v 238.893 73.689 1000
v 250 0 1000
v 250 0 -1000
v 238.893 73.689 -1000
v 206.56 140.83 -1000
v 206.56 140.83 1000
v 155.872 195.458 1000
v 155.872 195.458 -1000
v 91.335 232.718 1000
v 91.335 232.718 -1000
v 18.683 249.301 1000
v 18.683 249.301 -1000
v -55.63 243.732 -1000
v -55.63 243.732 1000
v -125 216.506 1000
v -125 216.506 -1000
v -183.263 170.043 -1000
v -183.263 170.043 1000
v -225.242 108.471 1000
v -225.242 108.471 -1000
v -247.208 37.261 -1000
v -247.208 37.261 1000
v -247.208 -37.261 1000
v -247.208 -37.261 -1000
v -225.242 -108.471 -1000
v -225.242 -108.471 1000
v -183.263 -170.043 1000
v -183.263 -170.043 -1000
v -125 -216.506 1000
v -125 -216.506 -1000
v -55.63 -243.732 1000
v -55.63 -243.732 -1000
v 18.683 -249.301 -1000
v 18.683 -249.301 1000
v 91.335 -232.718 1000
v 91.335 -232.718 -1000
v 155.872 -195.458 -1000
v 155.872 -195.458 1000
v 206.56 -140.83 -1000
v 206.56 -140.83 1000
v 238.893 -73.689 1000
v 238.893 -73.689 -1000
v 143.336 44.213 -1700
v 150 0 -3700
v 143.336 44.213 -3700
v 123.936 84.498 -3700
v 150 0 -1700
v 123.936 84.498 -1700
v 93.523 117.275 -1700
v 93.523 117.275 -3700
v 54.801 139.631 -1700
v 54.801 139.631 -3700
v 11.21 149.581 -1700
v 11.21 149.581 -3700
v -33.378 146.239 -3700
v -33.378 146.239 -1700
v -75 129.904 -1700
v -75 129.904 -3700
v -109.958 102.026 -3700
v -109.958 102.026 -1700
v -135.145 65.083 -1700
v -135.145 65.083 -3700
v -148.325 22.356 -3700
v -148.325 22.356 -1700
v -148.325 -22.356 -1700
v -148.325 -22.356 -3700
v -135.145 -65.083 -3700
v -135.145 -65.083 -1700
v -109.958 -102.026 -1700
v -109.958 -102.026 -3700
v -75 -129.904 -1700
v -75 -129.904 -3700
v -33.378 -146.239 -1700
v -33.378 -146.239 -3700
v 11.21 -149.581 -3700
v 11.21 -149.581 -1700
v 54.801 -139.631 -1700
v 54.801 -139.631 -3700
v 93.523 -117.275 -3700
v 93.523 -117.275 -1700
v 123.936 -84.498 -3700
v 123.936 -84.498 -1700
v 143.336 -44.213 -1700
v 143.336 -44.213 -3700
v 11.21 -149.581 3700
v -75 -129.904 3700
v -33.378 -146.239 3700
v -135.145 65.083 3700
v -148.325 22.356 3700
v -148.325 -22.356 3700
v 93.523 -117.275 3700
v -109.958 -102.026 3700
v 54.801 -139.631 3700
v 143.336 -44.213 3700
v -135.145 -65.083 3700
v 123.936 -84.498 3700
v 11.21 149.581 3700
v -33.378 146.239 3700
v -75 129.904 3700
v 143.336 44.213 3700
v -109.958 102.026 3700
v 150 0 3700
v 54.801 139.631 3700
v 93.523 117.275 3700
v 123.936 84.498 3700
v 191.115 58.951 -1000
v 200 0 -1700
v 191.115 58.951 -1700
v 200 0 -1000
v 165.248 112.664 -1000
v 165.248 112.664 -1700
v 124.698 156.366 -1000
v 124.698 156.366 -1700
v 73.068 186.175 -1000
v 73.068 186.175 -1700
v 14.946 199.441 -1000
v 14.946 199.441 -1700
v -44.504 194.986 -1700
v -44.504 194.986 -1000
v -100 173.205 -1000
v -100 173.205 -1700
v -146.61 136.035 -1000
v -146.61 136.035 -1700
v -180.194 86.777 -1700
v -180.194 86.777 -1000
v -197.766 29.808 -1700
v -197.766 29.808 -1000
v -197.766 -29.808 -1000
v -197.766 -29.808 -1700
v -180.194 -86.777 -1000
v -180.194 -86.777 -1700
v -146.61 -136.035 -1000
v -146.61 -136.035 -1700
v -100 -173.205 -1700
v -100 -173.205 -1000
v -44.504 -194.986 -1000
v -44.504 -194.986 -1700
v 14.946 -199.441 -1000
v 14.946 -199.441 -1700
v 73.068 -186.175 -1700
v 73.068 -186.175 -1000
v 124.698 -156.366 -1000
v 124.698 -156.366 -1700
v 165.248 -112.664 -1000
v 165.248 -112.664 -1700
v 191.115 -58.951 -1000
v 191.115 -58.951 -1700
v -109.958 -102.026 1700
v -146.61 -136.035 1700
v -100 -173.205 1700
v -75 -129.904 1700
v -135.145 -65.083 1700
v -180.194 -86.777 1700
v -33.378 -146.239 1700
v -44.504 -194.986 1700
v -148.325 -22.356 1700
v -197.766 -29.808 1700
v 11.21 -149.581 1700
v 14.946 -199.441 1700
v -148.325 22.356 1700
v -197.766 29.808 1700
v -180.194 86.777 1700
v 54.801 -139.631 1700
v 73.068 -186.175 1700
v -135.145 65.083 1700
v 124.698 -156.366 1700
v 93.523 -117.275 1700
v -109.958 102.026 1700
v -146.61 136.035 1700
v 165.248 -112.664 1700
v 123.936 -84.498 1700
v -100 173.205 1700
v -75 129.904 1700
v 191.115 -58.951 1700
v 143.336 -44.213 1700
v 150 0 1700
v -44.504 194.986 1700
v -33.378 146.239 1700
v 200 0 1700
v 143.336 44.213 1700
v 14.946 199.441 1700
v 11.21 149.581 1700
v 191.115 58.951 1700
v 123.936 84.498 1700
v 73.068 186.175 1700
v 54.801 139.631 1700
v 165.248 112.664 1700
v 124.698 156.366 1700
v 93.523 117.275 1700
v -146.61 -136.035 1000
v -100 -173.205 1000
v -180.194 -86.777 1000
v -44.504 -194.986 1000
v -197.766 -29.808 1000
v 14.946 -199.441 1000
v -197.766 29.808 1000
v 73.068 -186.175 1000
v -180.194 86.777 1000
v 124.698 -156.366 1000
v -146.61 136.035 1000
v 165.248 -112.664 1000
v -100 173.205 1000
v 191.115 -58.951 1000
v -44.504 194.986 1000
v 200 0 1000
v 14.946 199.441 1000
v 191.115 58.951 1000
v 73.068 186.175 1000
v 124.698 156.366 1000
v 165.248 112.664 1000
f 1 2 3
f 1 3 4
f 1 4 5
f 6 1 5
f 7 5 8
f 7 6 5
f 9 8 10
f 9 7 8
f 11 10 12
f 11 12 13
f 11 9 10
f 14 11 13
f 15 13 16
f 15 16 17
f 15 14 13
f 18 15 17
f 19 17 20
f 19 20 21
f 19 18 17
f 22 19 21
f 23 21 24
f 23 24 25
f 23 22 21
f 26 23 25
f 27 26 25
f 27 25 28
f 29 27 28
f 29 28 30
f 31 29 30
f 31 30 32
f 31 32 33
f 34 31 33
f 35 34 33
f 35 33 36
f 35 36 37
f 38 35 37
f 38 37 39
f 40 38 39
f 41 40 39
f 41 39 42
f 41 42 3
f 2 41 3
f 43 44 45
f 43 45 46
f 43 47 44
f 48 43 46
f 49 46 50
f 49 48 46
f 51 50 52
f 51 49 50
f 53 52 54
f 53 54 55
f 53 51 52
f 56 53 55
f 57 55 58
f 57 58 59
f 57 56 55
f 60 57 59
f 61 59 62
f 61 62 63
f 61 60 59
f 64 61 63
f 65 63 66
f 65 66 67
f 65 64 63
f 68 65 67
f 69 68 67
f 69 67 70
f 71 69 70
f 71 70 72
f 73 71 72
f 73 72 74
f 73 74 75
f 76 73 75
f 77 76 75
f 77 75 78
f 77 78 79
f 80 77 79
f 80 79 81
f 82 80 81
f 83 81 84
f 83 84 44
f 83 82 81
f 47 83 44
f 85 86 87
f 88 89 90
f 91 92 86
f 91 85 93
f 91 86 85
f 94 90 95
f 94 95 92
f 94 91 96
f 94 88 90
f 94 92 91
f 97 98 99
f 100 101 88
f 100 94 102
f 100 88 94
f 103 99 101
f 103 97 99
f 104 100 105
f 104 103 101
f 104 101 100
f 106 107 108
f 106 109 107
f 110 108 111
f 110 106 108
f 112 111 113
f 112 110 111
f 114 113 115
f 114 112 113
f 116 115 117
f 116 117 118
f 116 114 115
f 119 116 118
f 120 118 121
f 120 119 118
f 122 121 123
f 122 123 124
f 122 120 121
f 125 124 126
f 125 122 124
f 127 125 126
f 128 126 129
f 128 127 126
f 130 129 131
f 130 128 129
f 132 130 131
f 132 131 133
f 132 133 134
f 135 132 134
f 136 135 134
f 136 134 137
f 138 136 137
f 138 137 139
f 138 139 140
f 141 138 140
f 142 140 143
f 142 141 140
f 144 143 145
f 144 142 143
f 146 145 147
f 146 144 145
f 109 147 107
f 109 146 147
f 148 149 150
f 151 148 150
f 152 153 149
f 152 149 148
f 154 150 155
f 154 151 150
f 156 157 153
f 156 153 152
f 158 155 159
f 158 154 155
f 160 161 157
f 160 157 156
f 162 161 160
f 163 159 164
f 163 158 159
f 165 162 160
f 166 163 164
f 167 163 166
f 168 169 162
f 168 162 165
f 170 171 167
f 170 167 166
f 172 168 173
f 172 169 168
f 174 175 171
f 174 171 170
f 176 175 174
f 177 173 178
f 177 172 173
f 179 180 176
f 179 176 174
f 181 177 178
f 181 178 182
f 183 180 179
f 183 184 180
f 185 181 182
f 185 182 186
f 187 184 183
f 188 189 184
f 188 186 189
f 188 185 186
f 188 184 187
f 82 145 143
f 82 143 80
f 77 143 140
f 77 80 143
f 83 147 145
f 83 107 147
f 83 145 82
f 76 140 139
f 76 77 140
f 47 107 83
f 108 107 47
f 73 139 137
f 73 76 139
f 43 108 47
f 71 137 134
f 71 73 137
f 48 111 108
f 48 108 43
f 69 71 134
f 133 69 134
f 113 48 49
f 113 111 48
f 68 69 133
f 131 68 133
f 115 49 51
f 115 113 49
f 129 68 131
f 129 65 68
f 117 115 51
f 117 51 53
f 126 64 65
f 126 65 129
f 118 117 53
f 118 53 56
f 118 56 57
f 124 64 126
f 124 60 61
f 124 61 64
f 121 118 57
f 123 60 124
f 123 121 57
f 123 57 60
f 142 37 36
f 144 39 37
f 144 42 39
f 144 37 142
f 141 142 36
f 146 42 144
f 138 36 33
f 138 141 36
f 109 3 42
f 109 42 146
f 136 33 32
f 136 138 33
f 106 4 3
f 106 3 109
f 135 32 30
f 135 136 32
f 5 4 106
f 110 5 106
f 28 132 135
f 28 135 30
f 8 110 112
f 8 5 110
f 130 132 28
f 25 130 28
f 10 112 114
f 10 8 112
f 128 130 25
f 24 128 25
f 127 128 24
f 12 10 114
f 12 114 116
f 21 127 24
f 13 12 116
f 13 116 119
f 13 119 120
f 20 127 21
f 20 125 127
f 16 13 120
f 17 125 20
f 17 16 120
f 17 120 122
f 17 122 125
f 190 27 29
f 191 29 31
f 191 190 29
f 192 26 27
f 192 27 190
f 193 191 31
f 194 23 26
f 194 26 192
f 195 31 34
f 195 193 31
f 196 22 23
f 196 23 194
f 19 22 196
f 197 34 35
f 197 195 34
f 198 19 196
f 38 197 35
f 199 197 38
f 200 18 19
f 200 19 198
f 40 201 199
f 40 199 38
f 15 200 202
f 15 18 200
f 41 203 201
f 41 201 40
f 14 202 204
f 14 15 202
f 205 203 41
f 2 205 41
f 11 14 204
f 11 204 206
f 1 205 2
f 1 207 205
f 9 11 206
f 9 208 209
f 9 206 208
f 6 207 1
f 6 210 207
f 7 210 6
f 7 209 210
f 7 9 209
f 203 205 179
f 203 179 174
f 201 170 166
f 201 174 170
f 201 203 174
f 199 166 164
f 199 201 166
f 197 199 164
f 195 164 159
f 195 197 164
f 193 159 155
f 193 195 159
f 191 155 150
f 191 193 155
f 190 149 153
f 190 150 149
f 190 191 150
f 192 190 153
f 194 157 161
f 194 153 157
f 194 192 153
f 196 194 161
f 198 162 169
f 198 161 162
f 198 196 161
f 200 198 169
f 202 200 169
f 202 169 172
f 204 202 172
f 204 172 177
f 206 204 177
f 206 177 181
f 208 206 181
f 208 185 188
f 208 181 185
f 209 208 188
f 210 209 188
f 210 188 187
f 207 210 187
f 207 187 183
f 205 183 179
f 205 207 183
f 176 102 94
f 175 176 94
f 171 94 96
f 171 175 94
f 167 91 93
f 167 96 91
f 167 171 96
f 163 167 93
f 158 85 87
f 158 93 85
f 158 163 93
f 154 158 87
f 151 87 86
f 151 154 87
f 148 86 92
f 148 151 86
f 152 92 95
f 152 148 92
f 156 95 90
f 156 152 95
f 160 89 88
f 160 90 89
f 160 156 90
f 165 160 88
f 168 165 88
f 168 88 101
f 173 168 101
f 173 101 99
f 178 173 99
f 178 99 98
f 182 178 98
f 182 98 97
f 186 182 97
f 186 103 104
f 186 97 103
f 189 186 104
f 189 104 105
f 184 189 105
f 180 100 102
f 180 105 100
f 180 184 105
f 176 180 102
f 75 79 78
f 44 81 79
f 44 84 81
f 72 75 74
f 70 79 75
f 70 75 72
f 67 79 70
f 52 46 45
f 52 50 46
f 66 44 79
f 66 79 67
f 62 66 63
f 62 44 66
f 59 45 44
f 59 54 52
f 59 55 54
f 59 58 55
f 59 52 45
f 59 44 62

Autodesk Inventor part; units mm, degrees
ref_plane "YZ Plane" through (0, 0, 0) normal (1, 0, 0) x (0, 1, 0)
ref_plane "XZ Plane" through (0, 0, 0) normal (0, 1, 0) x (-1, 0, 0)
ref_plane "XY Plane" through (0, 0, 0) normal (0, 0, 1) x (1, 0, 0)
sketch "Sketch1" plane through (0, 0, 0) normal (0, 0, 1) x (1, 0, 0)
  circle A0 centre (0, 0) radius 250
  dimension "d0" = 500
extrude "Extrusion1" add sketch "Sketch1" along normal blind 1000
sketch "Sketch2" plane through (0, 0, 1000) normal (0, 0, 1) x (1, 0, 0)
  circle A0 centre (0, 0) radius 200
  dimension "d3" = 400
extrude "Extrusion2" add sketch "Sketch2" along normal blind 700
sketch "Sketch3" plane through (0, 0, 1700) normal (0, 0, 1) x (1, 0, 0)
  circle A0 centre (0, 0) radius 200 projected
  circle A1 centre (0, 0) radius 150
  dimension "d6" = 300
extrude "Extrusion3" add sketch "Sketch3" along normal blind 2000 contours A1
mirror "Mirror1" about plane through (0, 0, 0) normal (0, 0, -1) of "Extrusion3", "Extrusion2", "Extrusion1"
properties part number "A Shaft" material "Stainless Steel, 440C"
